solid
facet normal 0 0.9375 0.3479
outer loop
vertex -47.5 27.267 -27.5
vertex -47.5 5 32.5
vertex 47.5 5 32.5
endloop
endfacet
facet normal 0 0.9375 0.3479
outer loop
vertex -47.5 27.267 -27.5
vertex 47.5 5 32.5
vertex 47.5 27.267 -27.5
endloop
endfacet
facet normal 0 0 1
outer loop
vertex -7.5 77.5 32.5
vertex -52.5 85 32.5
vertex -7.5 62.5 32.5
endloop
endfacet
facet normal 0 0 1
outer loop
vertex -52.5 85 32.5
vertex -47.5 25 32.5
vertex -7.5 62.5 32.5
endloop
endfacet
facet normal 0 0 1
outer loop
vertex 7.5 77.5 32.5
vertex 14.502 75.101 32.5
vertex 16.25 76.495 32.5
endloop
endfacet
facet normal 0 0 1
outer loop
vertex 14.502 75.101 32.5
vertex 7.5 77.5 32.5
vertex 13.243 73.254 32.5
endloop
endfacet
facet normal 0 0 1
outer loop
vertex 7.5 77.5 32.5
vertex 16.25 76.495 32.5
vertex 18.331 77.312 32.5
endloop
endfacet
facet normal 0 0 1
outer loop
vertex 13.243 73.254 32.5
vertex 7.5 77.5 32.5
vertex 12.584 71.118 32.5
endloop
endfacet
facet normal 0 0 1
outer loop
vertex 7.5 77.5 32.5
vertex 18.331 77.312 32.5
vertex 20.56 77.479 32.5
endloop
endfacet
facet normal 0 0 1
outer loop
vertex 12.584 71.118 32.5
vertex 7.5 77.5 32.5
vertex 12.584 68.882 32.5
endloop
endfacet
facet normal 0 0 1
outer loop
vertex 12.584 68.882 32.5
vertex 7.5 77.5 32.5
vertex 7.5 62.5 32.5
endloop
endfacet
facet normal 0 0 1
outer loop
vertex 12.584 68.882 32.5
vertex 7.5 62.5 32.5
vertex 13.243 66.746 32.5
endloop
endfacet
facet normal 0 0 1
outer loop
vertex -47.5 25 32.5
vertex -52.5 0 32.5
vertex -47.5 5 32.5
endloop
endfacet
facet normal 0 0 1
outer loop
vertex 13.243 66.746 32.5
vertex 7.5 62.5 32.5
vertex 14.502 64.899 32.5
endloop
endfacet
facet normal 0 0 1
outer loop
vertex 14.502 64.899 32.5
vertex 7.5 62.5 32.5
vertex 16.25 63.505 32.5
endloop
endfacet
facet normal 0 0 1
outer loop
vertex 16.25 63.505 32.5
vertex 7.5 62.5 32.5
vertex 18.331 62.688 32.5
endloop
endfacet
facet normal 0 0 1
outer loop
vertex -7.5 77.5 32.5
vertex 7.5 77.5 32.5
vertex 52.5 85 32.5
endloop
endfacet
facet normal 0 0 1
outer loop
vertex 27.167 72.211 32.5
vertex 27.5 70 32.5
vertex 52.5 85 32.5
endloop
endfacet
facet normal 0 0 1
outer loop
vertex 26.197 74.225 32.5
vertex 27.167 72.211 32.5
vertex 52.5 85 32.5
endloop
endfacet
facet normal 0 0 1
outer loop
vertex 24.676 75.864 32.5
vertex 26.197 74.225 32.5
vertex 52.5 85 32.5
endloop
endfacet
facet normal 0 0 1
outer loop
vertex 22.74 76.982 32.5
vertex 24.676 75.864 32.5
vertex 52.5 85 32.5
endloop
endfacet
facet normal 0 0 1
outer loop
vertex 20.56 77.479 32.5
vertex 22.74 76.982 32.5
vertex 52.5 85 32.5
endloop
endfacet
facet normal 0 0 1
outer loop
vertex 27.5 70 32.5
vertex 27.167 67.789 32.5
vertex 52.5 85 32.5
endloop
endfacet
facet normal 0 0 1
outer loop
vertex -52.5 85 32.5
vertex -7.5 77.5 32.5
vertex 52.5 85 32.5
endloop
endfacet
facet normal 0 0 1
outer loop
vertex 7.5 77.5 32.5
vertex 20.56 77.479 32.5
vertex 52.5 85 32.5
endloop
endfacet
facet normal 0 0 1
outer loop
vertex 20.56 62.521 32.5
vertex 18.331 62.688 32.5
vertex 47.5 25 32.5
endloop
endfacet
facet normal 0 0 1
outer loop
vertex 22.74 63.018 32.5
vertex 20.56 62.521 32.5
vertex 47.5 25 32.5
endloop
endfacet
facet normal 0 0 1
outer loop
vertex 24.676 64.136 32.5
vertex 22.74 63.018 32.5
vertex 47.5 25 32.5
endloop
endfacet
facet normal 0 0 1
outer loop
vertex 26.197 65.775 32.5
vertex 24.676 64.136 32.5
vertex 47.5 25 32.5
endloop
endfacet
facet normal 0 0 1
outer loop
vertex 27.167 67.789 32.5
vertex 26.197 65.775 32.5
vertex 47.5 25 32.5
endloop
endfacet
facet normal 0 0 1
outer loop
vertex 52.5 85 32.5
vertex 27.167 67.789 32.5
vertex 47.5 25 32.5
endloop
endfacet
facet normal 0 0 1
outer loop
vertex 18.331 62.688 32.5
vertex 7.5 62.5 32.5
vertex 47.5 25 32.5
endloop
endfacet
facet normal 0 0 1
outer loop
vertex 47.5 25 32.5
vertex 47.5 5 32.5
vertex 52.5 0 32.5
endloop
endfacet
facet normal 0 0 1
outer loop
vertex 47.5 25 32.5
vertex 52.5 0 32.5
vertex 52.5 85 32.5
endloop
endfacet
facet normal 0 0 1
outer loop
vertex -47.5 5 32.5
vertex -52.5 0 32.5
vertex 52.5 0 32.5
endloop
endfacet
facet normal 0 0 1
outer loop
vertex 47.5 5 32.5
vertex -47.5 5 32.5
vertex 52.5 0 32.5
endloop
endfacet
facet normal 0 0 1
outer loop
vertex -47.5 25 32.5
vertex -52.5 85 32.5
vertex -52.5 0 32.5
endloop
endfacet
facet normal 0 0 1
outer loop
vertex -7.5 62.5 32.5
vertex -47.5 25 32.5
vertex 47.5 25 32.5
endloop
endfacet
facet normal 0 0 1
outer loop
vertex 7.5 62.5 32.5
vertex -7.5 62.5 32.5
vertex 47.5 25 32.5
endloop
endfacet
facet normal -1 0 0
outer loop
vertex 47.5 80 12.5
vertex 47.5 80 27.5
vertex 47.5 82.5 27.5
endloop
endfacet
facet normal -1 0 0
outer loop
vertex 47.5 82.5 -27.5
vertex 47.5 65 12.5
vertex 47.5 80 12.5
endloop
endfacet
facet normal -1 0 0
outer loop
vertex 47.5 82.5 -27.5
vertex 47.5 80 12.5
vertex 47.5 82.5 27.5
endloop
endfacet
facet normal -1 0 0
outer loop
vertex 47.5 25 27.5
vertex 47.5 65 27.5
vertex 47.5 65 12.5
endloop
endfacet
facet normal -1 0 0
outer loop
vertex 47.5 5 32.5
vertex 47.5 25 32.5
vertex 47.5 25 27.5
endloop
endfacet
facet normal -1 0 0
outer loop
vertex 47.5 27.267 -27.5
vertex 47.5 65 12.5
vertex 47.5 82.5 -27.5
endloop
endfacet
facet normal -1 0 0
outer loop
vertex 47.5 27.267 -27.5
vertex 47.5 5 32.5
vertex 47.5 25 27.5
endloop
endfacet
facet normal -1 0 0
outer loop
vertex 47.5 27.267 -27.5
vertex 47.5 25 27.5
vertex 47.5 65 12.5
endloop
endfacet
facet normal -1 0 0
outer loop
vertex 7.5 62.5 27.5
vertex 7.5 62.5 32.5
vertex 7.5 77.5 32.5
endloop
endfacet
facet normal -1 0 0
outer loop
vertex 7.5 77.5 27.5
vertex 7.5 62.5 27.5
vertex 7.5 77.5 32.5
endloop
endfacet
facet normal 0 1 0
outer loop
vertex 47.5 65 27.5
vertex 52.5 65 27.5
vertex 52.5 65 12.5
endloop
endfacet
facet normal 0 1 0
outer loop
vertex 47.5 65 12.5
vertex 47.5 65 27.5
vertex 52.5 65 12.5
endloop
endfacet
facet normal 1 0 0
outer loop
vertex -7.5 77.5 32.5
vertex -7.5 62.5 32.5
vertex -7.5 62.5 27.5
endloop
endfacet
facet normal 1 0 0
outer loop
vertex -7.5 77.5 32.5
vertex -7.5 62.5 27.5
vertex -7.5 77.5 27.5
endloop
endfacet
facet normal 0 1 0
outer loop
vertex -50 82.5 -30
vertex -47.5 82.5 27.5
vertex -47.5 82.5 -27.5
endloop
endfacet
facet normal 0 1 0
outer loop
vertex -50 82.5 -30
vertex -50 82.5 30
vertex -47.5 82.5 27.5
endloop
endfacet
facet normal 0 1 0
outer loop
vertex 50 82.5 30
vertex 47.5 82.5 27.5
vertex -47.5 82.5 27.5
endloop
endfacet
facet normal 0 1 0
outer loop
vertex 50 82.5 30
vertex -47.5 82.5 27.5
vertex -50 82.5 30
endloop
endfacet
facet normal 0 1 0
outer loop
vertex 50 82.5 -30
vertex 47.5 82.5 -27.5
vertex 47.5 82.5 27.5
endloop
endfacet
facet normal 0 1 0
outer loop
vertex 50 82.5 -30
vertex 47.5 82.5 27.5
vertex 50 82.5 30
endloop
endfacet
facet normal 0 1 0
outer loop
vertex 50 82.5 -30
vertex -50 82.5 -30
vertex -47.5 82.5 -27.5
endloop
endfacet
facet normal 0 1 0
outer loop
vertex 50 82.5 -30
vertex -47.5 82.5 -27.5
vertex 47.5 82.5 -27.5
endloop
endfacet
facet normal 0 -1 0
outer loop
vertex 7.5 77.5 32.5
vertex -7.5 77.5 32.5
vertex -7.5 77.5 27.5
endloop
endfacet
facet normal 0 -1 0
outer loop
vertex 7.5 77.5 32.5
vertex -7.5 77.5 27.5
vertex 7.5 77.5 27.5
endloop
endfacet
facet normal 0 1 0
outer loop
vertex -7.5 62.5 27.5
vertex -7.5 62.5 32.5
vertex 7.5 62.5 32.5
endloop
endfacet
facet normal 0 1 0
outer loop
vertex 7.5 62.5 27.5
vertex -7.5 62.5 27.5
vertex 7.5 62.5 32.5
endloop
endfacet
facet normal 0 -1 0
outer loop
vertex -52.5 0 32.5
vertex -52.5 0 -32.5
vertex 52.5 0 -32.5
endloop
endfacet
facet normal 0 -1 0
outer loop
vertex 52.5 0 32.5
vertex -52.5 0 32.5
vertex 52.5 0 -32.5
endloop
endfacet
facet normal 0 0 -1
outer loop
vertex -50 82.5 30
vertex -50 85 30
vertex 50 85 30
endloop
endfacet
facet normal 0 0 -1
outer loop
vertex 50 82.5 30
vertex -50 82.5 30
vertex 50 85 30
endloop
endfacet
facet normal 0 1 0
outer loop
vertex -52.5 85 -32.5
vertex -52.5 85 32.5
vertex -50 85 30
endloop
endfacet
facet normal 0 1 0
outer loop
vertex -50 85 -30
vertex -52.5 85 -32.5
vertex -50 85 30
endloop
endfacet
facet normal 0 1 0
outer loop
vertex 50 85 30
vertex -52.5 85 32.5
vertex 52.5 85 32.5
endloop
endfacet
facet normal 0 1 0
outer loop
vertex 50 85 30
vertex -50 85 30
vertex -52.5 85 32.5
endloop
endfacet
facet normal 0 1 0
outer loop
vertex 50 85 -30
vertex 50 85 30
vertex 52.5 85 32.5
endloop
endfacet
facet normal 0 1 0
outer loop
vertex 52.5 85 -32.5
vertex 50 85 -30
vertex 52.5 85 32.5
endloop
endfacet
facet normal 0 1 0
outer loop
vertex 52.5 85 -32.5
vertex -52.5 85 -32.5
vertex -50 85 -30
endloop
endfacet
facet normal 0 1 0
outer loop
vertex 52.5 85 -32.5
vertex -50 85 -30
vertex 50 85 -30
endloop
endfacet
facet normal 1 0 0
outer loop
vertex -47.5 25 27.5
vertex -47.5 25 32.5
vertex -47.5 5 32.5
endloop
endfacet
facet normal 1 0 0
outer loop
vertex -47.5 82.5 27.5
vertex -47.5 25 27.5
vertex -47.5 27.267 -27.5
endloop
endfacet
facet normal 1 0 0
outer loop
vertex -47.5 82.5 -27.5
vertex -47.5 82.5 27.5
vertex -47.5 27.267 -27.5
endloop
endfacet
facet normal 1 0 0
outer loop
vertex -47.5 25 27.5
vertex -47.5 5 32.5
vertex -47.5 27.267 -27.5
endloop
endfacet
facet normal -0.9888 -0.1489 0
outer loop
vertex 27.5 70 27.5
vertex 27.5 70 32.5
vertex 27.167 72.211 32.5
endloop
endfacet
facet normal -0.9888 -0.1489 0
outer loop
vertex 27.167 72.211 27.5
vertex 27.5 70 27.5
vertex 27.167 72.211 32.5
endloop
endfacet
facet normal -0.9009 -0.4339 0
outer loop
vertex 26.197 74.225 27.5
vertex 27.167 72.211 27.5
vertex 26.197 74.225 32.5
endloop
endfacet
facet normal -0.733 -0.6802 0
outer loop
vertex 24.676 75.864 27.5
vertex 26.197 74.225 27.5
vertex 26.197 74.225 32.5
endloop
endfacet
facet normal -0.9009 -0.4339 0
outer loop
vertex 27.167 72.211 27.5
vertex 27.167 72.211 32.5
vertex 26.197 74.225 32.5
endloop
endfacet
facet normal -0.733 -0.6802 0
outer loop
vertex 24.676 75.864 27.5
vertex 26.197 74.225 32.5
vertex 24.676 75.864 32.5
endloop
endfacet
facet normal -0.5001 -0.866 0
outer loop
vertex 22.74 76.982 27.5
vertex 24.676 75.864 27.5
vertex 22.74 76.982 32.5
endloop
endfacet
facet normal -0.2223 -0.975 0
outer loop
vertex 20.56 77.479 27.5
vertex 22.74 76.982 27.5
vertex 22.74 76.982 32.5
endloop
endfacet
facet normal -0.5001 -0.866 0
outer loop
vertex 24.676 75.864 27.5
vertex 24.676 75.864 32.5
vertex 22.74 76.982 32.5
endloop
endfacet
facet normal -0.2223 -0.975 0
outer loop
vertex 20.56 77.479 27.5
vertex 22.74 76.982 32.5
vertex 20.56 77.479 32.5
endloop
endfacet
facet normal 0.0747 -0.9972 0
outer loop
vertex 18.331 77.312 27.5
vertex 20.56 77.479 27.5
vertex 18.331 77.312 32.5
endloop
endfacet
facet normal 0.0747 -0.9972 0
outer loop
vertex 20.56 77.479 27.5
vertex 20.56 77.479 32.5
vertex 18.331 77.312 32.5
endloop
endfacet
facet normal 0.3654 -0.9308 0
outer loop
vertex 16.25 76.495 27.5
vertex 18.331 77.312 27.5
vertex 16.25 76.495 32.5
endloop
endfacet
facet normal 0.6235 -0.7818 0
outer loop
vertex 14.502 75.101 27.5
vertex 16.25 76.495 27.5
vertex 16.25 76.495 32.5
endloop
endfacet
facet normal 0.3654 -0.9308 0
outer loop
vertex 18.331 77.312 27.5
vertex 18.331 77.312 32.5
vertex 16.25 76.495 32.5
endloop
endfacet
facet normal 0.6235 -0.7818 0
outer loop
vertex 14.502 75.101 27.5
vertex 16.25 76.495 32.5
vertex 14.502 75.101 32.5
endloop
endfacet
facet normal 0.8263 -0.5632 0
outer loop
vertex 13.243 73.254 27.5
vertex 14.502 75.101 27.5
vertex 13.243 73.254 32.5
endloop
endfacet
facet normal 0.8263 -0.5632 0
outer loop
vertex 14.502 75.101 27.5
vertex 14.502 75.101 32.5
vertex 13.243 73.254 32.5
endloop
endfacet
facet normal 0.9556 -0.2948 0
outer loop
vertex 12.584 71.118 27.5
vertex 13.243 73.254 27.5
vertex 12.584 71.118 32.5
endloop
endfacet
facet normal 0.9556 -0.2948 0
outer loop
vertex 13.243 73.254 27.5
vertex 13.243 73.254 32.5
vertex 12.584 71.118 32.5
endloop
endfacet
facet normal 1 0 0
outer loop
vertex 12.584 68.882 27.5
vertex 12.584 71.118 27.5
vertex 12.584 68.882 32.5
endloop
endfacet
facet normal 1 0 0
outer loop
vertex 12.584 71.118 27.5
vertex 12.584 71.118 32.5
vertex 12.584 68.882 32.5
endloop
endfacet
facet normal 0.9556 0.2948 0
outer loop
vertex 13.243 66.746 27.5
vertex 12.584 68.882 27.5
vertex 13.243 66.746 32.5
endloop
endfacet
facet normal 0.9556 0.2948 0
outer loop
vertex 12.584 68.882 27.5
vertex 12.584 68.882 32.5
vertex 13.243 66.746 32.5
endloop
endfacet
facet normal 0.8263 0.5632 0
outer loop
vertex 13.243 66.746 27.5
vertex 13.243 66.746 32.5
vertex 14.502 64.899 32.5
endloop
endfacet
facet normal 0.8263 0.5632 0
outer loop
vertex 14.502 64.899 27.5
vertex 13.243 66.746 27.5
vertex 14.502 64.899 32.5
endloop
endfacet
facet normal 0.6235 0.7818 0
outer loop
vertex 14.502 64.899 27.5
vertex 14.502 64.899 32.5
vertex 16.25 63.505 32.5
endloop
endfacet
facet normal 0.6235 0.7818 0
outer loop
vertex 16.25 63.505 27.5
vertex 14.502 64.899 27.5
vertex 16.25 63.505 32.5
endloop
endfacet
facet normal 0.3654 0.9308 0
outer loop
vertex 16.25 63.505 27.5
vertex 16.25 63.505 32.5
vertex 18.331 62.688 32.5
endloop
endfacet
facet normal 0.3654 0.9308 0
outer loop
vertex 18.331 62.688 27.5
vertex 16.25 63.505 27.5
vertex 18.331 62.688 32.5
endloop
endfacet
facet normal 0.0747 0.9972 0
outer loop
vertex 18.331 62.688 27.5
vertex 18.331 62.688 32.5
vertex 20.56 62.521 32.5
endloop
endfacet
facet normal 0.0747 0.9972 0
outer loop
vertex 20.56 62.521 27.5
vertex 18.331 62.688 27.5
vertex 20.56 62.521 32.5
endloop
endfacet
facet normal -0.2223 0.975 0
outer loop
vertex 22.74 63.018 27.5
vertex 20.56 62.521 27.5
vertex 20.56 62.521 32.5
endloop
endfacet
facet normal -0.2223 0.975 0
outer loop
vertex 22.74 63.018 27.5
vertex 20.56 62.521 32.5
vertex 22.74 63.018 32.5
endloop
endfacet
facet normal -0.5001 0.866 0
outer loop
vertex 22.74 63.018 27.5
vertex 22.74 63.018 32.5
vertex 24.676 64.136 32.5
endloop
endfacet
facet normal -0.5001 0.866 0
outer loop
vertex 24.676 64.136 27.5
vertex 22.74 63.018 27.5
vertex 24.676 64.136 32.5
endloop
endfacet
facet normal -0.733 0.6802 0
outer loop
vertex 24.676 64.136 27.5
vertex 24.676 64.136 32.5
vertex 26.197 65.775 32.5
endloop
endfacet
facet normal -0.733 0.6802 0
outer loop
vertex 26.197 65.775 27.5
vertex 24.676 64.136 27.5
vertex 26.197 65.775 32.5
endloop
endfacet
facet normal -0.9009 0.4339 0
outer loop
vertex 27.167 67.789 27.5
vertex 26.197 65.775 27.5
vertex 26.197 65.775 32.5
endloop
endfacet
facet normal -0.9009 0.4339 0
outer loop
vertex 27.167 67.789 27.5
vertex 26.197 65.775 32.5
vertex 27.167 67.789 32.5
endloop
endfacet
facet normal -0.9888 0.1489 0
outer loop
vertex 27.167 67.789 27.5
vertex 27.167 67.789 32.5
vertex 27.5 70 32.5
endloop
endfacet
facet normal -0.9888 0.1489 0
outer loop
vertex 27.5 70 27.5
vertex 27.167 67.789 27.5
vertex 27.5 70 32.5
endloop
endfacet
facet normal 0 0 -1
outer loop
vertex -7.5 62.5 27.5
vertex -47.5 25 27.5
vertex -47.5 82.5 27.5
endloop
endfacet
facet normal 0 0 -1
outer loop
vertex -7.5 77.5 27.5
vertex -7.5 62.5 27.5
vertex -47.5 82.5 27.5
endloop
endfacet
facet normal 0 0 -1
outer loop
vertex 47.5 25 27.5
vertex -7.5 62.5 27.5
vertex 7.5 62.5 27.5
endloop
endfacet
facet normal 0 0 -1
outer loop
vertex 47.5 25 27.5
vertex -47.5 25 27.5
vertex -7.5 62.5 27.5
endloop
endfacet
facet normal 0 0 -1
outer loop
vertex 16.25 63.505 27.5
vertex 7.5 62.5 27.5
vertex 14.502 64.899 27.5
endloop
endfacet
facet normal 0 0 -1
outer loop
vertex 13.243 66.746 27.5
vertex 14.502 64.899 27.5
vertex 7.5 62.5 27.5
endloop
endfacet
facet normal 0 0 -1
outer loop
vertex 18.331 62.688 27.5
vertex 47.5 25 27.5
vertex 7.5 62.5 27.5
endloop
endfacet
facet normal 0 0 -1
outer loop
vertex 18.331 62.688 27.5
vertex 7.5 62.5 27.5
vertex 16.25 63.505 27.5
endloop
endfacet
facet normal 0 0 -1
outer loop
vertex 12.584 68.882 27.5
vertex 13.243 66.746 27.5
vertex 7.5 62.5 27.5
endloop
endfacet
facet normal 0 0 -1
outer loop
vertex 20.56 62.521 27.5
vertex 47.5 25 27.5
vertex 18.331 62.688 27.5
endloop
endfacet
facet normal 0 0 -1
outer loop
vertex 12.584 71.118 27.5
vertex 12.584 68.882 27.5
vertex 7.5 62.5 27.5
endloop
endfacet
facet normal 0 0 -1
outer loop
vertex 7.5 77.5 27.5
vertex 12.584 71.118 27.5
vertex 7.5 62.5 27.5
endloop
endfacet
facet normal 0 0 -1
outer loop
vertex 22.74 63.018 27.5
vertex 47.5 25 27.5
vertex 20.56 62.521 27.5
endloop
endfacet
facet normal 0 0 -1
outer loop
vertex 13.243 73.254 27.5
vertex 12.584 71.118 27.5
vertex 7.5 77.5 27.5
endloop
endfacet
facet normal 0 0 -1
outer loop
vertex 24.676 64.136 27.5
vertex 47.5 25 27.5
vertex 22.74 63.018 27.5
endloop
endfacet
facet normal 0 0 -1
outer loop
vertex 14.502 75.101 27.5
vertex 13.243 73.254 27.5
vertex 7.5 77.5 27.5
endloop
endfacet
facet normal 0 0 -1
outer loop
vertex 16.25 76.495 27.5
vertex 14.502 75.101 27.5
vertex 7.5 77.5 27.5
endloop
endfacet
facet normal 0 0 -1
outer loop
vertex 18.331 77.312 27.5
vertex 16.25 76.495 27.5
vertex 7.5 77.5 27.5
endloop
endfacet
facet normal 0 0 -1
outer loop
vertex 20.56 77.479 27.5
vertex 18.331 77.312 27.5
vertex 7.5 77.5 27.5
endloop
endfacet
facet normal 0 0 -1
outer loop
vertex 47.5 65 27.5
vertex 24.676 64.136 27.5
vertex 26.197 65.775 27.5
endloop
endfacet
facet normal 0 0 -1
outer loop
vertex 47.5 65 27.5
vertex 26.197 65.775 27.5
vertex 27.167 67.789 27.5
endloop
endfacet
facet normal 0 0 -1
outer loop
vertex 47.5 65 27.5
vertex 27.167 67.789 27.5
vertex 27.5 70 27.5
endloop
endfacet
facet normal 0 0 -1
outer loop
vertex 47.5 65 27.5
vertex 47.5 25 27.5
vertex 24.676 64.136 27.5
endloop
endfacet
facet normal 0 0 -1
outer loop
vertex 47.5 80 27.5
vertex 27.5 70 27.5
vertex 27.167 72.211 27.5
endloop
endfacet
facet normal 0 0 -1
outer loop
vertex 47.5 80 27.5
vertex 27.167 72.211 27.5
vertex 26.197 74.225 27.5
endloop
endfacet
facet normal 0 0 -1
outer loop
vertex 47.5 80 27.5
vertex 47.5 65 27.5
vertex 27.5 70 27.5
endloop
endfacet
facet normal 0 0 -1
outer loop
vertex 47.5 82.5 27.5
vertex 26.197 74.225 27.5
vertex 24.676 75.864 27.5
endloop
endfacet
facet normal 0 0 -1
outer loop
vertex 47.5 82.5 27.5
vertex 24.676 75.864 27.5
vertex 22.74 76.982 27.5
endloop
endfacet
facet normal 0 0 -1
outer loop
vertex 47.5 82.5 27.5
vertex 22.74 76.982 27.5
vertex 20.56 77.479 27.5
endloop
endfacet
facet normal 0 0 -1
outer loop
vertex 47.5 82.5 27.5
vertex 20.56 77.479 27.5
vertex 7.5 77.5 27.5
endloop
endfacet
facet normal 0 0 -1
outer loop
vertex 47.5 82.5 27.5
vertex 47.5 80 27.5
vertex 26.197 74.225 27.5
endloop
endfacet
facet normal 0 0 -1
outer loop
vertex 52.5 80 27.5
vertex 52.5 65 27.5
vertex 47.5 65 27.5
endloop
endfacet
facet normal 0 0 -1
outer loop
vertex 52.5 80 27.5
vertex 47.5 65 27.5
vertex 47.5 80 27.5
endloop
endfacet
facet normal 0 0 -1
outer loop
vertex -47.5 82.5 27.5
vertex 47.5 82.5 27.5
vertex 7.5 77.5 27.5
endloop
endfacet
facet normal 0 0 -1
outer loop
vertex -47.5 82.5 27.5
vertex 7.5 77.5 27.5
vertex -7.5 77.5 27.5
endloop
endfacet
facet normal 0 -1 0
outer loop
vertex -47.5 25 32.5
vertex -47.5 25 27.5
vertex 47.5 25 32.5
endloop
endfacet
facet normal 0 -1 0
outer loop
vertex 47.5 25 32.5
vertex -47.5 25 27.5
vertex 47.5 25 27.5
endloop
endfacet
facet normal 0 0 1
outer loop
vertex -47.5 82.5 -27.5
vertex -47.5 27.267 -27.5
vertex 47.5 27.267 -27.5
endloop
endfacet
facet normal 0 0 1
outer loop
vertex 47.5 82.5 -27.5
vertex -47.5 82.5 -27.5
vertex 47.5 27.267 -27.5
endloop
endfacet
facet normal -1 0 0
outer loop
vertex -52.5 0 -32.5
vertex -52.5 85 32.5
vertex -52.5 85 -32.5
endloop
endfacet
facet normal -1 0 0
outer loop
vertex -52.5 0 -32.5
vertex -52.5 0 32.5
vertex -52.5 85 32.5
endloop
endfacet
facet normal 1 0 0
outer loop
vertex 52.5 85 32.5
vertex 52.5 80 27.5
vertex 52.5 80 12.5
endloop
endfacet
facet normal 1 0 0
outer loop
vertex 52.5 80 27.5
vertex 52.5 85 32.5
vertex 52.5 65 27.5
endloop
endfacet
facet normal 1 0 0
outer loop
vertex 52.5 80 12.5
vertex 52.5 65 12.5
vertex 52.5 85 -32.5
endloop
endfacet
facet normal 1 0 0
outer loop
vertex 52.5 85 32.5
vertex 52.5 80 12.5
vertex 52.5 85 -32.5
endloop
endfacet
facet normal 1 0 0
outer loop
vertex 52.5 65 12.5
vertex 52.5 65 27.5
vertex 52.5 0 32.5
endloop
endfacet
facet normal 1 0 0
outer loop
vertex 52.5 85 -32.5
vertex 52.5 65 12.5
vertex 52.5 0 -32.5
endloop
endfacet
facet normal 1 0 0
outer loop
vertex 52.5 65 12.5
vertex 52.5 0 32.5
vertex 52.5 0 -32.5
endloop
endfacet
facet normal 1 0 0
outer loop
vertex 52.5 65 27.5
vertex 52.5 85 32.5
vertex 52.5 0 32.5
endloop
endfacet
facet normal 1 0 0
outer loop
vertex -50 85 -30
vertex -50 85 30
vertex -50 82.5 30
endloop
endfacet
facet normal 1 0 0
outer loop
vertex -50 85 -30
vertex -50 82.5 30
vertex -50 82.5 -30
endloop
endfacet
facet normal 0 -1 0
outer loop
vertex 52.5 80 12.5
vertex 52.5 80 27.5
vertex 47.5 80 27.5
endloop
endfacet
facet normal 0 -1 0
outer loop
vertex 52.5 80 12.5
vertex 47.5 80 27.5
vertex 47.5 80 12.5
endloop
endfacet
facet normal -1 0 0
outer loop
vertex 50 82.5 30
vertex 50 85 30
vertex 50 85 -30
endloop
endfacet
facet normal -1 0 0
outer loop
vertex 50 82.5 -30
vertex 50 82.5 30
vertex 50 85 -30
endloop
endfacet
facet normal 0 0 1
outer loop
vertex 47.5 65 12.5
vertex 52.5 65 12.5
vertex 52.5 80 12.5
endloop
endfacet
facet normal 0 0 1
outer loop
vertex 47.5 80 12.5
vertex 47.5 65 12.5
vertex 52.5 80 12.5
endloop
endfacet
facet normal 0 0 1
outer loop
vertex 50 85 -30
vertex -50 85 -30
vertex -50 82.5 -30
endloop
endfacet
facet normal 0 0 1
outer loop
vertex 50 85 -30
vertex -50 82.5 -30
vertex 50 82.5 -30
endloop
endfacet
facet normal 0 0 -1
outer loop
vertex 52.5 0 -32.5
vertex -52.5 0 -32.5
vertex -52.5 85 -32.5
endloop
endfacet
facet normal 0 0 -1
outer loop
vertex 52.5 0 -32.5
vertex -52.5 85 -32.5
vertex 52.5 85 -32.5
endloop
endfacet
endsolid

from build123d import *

# Parameters (mm, degrees)
SKETCH1_W           = 105
SKETCH1_H           = 65
BOSS_EXTRUDE1_DEPTH = 5
BOSS_EXTRUDE2_DEPTH = 20
SKETCH3_W           = 105
SKETCH3_H           = 65
SKETCH3_W_2         = 95
SKETCH3_H_2         = 55
BOSS_EXTRUDE3_DEPTH = 60
SKETCH4_W           = 100
SKETCH4_H           = 60
CUT_EXTRUDE1_DEPTH  = 2.5
SKETCH5_W           = 15
SKETCH5_H           = 15
SKETCH5_R           = 7.5
CUT_EXTRUDE3_DEPTH  = 10
SKETCH6_W           = 15
SKETCH6_H           = 15
CUT_EXTRUDE4_DEPTH  = 10
BOSS_EXTRUDE4_DEPTH = 95


with BuildPart() as part:
    # Sketch1 → Boss-Extrude1 (new body)
    with BuildSketch(Plane(origin=(0, 0, 0), x_dir=(1, 0, 0), z_dir=(0, 1, 0))):
        Rectangle(SKETCH1_W, SKETCH1_H)
    extrude(amount=BOSS_EXTRUDE1_DEPTH)

    # Sketch2 → Boss-Extrude2 (add)
    with BuildSketch(Plane(origin=(0, 5, 0), x_dir=(1, 0, 0), z_dir=(0, 1, 0))):
        Polygon((-47.5, -32.5), (-47.5, 27.5), (47.5, 27.5), (47.5, -32.5), (52.5, -32.5), (52.5, 32.5), (-52.5, 32.5), (-52.5, -32.5), align=None)
    extrude(amount=BOSS_EXTRUDE2_DEPTH)

    # Sketch3 → Boss-Extrude3 (add)
    with BuildSketch(Plane(origin=(0, 25, 0), x_dir=(1, 0, 0), z_dir=(0, 1, 0))):
        Rectangle(SKETCH3_W, SKETCH3_H)
        Rectangle(SKETCH3_W_2, SKETCH3_H_2, mode=Mode.SUBTRACT)
    extrude(amount=BOSS_EXTRUDE3_DEPTH)

    # Sketch4 → Cut-Extrude1 (cut)
    with BuildSketch(Plane(origin=(0, 85, 0), x_dir=(1, 0, 0), z_dir=(0, 1, 0))):
        Rectangle(SKETCH4_W, SKETCH4_H)
    extrude(amount=-CUT_EXTRUDE1_DEPTH, mode=Mode.SUBTRACT)

    # Sketch5 → Cut-Extrude3 (cut)
    with BuildSketch(Plane.XY.offset(32.5)):
        with Locations((0, 70)):
            Rectangle(SKETCH5_W, SKETCH5_H)
        with Locations((20, 70)):
            Circle(SKETCH5_R)
    extrude(amount=-CUT_EXTRUDE3_DEPTH, mode=Mode.SUBTRACT)

    # Sketch6 → Cut-Extrude4 (cut)
    with BuildSketch(Plane(origin=(52.5, 0, 0), x_dir=(0, 0, -1), z_dir=(1, 0, 0))):
        with Locations((-20, 72.5)):
            Rectangle(SKETCH6_W, SKETCH6_H)
    extrude(amount=-CUT_EXTRUDE4_DEPTH, mode=Mode.SUBTRACT)

    # Sketch10 → Boss-Extrude4 (add)
    with BuildSketch(Plane(origin=(-47.5, 0, 0), x_dir=(0, 0, -1), z_dir=(1, 0, 0))):
        Polygon((-32.5, 5), (27.5, 27.267325642), (27.5, 5), align=None)
    extrude(amount=BOSS_EXTRUDE4_DEPTH)


solid = part.part
